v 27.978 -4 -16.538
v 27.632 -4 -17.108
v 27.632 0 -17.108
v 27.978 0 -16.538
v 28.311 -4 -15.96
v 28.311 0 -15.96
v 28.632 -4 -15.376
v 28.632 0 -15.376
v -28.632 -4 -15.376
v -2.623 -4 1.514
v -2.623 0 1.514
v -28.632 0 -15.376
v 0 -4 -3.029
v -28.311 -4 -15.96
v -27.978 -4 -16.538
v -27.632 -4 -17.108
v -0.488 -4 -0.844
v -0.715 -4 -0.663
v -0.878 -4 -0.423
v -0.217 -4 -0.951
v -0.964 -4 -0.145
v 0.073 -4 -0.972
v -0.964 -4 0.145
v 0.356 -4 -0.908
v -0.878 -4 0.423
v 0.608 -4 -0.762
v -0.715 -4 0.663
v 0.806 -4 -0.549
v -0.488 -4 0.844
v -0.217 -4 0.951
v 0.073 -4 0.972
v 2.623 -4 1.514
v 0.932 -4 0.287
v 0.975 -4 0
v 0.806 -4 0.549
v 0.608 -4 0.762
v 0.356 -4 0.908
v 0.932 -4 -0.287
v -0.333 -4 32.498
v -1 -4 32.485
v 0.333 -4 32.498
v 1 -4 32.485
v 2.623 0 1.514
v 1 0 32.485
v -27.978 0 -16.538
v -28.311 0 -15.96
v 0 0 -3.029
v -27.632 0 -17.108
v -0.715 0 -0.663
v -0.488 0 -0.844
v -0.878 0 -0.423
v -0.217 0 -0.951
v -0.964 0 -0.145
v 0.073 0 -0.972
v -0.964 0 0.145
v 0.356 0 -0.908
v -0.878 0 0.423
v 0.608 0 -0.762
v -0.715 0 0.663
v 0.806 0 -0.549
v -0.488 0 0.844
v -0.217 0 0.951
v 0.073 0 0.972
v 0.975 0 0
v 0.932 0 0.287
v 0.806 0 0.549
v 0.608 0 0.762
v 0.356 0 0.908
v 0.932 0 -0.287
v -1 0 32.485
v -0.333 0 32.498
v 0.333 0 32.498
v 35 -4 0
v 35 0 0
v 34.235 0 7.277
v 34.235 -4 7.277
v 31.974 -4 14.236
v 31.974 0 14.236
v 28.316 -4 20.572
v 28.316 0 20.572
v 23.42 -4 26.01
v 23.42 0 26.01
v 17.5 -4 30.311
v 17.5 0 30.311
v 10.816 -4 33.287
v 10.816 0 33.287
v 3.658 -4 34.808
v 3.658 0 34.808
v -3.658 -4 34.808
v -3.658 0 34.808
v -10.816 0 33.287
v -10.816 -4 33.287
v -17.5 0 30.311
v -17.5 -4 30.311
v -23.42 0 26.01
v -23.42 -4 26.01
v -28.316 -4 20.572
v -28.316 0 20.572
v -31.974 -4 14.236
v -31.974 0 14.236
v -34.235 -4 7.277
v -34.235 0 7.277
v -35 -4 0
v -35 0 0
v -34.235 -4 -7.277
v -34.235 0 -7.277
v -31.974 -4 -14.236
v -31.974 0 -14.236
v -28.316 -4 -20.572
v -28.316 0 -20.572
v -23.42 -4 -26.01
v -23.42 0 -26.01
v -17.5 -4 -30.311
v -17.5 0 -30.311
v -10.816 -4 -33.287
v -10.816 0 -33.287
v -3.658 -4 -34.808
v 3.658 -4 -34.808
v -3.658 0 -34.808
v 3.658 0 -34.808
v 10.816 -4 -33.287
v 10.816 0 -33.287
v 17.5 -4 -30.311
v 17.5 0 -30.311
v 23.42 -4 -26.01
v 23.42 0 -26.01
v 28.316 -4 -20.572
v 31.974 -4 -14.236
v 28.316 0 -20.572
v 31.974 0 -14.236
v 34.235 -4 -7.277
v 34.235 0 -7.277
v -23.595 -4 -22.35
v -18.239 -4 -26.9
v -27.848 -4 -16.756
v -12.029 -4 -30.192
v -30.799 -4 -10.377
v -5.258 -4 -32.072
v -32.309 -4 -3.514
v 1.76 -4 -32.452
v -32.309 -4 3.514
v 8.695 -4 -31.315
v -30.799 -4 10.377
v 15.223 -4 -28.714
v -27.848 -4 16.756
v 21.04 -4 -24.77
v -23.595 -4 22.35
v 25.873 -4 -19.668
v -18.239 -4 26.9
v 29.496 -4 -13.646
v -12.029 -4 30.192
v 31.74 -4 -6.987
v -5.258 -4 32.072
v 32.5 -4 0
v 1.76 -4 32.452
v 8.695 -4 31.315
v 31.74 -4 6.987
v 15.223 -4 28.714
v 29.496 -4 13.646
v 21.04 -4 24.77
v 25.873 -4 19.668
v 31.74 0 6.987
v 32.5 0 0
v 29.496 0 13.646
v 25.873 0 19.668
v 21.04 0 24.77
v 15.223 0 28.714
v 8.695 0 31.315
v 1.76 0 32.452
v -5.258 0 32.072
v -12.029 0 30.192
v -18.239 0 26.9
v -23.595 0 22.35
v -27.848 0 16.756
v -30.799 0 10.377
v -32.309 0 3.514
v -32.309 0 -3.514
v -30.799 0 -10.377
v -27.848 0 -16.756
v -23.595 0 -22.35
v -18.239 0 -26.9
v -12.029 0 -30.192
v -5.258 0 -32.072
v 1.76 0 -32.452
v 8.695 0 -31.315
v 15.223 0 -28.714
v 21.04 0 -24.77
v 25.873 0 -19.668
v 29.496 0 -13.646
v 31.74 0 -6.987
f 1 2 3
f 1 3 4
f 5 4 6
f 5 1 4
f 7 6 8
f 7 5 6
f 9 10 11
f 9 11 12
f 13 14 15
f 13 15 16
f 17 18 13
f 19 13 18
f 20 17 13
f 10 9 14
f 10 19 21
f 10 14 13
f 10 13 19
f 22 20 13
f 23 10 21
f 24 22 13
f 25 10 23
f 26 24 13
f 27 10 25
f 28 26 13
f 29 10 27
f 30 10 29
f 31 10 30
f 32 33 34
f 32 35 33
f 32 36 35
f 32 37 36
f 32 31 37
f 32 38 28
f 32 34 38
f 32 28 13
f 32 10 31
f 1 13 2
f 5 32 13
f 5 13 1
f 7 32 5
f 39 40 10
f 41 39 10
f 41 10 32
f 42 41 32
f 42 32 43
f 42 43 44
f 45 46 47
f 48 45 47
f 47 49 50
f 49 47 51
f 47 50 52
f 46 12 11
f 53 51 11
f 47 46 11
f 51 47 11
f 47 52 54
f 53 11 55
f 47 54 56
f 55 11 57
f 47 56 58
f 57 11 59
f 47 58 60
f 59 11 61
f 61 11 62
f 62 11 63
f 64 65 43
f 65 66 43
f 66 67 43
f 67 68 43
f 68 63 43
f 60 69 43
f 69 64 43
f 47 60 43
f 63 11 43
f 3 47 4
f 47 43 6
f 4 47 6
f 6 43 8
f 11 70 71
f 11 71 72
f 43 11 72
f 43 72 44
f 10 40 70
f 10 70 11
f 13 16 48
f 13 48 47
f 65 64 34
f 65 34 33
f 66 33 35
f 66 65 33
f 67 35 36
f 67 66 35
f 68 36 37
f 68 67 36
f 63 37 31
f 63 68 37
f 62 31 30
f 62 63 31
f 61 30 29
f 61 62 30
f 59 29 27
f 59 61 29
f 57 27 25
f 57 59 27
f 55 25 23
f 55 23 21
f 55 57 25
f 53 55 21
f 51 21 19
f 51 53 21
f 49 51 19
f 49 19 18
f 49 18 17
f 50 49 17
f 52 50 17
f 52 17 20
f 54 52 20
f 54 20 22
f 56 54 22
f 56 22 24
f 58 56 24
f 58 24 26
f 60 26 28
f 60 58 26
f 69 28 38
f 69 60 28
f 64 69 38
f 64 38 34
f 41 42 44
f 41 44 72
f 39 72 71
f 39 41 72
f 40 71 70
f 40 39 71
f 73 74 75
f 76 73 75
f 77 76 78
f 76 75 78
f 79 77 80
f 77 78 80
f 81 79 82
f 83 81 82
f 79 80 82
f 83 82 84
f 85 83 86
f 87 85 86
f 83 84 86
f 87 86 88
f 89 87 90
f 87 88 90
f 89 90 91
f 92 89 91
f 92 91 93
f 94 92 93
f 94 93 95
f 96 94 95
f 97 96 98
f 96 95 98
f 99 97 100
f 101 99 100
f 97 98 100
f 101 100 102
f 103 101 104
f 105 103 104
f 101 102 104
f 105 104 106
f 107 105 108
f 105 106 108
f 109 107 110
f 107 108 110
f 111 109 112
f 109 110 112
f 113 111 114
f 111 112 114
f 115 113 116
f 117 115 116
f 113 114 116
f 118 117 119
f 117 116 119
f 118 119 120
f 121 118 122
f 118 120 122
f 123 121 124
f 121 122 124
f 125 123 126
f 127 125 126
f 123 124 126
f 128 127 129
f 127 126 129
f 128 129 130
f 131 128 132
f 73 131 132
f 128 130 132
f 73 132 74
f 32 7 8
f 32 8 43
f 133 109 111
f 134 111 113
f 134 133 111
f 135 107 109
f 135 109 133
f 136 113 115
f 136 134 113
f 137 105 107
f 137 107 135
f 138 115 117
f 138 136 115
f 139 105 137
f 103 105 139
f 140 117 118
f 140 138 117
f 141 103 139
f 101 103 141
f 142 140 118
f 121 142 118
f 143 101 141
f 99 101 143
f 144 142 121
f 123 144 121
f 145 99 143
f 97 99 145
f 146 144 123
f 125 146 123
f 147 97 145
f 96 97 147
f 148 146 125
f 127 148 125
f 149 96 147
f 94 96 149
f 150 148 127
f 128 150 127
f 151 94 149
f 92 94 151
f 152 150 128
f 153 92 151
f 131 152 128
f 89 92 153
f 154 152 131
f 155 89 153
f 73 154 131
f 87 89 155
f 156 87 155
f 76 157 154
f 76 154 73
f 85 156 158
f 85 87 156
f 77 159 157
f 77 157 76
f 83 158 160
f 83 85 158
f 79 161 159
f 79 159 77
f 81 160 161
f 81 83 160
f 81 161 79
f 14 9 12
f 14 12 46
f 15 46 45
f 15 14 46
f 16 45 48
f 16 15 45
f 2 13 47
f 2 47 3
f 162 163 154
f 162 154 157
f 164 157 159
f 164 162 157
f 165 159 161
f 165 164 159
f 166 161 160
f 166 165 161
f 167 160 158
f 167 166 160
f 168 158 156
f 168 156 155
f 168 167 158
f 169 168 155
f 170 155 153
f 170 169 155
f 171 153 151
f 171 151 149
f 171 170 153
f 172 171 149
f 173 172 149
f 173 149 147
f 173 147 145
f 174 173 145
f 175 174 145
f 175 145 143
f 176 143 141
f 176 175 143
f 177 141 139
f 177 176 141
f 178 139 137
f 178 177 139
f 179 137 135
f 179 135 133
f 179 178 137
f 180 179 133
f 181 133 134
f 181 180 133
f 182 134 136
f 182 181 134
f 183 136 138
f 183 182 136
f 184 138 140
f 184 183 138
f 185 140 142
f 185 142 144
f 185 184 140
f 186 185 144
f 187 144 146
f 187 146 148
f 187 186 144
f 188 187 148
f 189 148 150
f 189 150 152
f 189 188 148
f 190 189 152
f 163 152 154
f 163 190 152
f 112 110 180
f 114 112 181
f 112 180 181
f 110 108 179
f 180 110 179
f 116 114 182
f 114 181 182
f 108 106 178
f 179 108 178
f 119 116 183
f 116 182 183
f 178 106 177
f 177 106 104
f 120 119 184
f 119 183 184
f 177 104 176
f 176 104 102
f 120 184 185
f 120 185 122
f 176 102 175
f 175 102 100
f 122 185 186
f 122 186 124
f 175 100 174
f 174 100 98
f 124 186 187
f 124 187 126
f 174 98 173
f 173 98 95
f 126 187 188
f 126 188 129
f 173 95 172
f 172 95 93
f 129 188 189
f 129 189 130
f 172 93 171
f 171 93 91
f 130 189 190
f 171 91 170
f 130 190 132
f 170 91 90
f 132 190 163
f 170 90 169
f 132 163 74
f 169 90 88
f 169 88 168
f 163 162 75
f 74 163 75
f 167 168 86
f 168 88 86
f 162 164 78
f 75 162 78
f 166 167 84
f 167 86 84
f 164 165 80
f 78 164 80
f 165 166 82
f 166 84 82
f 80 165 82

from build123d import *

# Parameters (mm, degrees)
F0_R     = 35
F0_R_2   = 32.5
F1_DEPTH = 4
F0_R_3   = 2.975
F0_R_4   = 0.975
F3_DEPTH = 4


with BuildPart() as f1:
    # F0 (on Front) → F1 (new body)
    with BuildSketch(Plane.XZ):
        Circle(F0_R)
        Circle(F0_R_2, mode=Mode.SUBTRACT)
    extrude(amount=F1_DEPTH)

    # F4 (on Right) → F5 (revolve, cut)
    with BuildSketch(Plane.YZ):
        Polygon((0, 32.5291901827), (2.1413064096, 1.5684039099), (5.6291026995, 1.5684039099), (5.6291026995, 33.8882990181), (0, 33.8882990181), align=None)
    revolve(axis=Axis((0, 0.7535219193, 0), (0, 1, 0)), mode=Mode.SUBTRACT)


with BuildPart() as f1b:
    # F0 (on Front) → F1, piece 2 (new body)
    with BuildSketch(Plane.XZ):
        Circle(F0_R_3)
        Circle(F0_R_4, mode=Mode.SUBTRACT)
    extrude(amount=F1_DEPTH)

    # F2 (on face) → F3 (join)
    with BuildSketch(Plane.XZ.offset(4)):
        with BuildLine():
            Line((2.6230781922, 1.5144349004), (1, 32.4846117416))
            ThreePointArc((1, 32.4846117416), (0, 32.5), (-1, 32.4846117416))
            Line((-1, 32.4846117416), (-2.6230781922, 1.5144349004))
            Line((-2.6230781922, 1.5144349004), (-2.5198255703, 1.5814879371))
            ThreePointArc((-2.5198255703, 1.5814879371), (0, 2.975), (2.5198255703, 1.5814879371))
            Line((2.5198255703, 1.5814879371), (2.6230781922, 1.5144349004))
        make_face()
        with BuildLine():
            Line((28.6324990003, -15.376280467), (2.6230781922, 1.5144349004))
            Line((2.6230781922, 1.5144349004), (2.6295215145, 1.3914889884))
            ThreePointArc((2.6295215145, 1.3914889884), (2.8873388704, 0.7168676637), (2.975, 0))
            ThreePointArc((2.975, 0), (2.1420749793, -2.0644950431), (0.1096959442, -2.9729769255))
            Line((0.1096959442, -2.9729769255), (0, -3.0288698008))
            Line((0, -3.0288698008), (27.6324990003, -17.1083312746))
            ThreePointArc((27.6324990003, -17.1083312746), (28.145825623, -16.25), (28.6324990003, -15.376280467))
        make_face()
        with BuildLine():
            Line((2.6295215145, 1.3914889884), (2.6230781922, 1.5144349004))
            Line((2.6230781922, 1.5144349004), (2.5198255703, 1.5814879371))
            ThreePointArc((2.5198255703, 1.5814879371), (2.5764255763, 1.4875), (2.6295215145, 1.3914889884))
        make_face()
        with BuildLine():
            Line((-2.5198255703, 1.5814879371), (-2.6230781922, 1.5144349004))
            Line((-2.6230781922, 1.5144349004), (-2.6295215145, 1.3914889884))
            ThreePointArc((-2.6295215145, 1.3914889884), (-2.5764255763, 1.4875), (-2.5198255703, 1.5814879371))
        make_face()
        with BuildLine():
            Line((-2.6295215145, 1.3914889884), (-2.6230781922, 1.5144349004))
            Line((-2.6230781922, 1.5144349004), (-28.6324990003, -15.376280467))
            ThreePointArc((-28.6324990003, -15.376280467), (-28.145825623, -16.25), (-27.6324990003, -17.1083312746))
            Line((-27.6324990003, -17.1083312746), (0, -3.0288698008))
            Line((0, -3.0288698008), (-0.1096959442, -2.9729769255))
            ThreePointArc((-0.1096959442, -2.9729769255), (-2.5764255763, -1.4875), (-2.6295215145, 1.3914889884))
        make_face()
        with BuildLine():
            Line((0, -3.0288698008), (0.1096959442, -2.9729769255))
            ThreePointArc((0.1096959442, -2.9729769255), (0, -2.975), (-0.1096959442, -2.9729769255))
            Line((-0.1096959442, -2.9729769255), (0, -3.0288698008))
        make_face()
    extrude(amount=-F3_DEPTH)


solid = Compound([f1.part, f1b.part])
